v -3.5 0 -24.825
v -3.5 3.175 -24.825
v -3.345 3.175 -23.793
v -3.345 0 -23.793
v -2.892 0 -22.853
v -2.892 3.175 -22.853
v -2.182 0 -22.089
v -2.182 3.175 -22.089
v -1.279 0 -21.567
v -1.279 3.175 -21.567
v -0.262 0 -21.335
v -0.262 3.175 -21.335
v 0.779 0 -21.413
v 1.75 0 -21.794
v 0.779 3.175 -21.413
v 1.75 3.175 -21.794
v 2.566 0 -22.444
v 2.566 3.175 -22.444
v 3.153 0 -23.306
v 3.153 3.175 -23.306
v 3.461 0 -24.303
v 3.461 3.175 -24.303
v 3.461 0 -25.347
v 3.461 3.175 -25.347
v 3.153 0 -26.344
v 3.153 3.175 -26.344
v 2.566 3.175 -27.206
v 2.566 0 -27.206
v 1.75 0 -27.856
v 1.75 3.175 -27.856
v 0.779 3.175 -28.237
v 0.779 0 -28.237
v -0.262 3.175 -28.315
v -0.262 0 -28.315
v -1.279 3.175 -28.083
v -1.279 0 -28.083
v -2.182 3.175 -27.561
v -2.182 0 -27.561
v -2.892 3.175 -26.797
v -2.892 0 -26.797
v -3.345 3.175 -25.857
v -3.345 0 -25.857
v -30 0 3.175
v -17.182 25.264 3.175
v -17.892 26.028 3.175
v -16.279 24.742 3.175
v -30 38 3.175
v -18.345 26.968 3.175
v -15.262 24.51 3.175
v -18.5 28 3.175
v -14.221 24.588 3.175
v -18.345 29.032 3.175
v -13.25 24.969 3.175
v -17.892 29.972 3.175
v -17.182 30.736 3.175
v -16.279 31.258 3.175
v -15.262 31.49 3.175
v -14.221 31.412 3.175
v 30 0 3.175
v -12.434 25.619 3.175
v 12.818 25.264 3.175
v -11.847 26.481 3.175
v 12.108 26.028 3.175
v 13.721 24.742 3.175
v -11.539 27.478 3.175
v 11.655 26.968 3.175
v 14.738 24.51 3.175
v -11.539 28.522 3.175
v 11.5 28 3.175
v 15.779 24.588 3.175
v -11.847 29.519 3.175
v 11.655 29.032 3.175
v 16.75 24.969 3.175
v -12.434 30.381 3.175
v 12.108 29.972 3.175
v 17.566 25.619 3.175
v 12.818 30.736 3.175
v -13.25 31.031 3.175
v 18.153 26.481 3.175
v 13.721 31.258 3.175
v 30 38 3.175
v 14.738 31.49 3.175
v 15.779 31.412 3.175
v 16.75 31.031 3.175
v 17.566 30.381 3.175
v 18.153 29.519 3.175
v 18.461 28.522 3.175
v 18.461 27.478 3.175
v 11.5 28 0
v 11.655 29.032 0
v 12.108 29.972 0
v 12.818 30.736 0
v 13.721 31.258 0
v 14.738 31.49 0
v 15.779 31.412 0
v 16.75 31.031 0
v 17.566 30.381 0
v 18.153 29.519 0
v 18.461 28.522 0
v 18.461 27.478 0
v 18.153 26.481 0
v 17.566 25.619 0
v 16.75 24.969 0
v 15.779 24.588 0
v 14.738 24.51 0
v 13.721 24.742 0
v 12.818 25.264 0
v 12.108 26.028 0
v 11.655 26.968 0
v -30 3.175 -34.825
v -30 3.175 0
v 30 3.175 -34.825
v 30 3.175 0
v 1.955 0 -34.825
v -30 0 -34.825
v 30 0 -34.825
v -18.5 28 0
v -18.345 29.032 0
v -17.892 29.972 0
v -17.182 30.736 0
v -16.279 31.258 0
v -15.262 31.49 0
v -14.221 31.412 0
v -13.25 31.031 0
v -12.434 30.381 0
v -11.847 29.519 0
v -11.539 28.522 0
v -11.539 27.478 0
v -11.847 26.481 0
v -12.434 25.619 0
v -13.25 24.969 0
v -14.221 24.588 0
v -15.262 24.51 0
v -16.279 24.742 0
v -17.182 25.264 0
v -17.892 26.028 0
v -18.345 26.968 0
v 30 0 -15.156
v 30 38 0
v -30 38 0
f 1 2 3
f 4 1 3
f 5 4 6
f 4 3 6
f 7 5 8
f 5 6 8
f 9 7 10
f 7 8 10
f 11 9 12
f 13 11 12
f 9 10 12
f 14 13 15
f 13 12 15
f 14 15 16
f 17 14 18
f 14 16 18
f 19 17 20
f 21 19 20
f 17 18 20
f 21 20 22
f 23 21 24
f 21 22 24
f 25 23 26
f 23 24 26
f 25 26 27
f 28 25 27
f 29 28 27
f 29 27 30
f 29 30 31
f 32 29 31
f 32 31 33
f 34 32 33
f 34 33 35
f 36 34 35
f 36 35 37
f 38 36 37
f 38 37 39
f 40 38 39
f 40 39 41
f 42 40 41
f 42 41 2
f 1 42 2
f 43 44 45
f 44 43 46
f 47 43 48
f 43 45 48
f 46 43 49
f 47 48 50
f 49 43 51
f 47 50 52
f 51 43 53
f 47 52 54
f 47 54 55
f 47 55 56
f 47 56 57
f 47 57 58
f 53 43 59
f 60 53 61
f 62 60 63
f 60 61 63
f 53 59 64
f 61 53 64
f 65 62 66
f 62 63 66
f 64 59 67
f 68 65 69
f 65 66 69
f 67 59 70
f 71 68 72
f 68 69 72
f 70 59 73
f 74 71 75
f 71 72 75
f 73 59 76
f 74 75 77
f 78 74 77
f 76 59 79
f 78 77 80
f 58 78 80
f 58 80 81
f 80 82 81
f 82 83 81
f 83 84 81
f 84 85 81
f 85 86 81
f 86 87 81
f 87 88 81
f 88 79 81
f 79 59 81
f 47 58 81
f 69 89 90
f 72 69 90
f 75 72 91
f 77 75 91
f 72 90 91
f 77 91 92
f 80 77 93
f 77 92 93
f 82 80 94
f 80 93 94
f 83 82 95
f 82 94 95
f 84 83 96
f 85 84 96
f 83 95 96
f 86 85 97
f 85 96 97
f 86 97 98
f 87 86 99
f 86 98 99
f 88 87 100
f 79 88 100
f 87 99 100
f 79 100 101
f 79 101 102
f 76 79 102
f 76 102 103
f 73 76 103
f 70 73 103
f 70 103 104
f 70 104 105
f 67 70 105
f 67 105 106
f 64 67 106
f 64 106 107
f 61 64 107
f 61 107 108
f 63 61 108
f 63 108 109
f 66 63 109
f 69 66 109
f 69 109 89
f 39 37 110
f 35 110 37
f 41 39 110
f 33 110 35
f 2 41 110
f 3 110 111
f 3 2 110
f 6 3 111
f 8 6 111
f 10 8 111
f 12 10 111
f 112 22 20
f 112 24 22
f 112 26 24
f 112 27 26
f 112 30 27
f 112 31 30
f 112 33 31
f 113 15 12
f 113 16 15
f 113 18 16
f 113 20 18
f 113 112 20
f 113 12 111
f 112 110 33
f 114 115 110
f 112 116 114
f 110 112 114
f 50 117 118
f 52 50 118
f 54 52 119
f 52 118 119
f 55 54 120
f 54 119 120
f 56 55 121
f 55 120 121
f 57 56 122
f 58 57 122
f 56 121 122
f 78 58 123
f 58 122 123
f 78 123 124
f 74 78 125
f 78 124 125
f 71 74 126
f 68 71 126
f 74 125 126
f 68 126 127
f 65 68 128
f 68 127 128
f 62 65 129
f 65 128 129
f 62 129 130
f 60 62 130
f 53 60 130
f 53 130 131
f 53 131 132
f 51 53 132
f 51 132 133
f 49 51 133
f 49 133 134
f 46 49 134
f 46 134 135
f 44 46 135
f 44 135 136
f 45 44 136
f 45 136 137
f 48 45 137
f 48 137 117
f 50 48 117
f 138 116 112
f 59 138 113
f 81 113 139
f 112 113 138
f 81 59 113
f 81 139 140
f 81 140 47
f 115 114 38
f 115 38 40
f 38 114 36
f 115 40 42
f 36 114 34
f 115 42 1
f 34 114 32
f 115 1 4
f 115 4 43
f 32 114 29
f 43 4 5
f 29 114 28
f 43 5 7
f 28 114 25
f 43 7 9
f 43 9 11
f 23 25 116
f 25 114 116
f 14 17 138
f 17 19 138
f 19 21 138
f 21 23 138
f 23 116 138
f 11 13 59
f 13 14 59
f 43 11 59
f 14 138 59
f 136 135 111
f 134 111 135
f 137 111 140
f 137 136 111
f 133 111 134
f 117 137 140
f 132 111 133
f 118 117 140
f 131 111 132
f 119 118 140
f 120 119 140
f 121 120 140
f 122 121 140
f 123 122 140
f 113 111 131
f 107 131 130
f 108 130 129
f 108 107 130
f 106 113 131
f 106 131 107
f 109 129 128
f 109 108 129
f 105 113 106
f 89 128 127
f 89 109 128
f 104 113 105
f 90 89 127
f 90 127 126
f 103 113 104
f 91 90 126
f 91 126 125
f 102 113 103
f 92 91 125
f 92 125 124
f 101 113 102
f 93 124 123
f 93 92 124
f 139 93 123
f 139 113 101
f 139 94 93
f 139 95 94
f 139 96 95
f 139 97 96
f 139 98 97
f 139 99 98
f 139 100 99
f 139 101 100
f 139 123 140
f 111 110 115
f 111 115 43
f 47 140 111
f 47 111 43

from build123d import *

# Parameters (mm, degrees)
SKETCH1_W               = 30
SKETCH1_H               = 38
BOSS_EXTRUDE1_DEPTH     = 3.175
SKETCH2_W               = 30
SKETCH2_H               = 3.175
BOSS_EXTRUDE2_DEPTH     = 34.825
SKETCH3_R               = 4
CUT_EXTRUDE1_DEPTH      = 60.638751035
SKETCH4_R               = 4
CUT_EXTRUDE2_DEPTH      = 58.667679423
CROQUIS4_R              = 4
CROQUIS4_R_2            = 3.5
SALIENTE_EXTRUIR2_DEPTH = 5
CROQUIS5_W              = 3.979032683
CROQUIS5_H              = 10.100326852
CORTAR_EXTRUIR1_DEPTH   = 36
CROQUIS6_W              = 38
CROQUIS6_H              = 3.175
SALIENTE_EXTRUIR3_DEPTH = 30
CROQUIS7_W              = 3.175
CROQUIS7_H              = 34.825
SALIENTE_EXTRUIR4_DEPTH = 30
CROQUIS8_R              = 3.5
CORTAR_EXTRUIR2_DEPTH   = 30
CROQUIS9_W              = 28.045440503
CROQUIS9_H              = 19.668665091
SALIENTE_EXTRUIR5_DEPTH = 9
CROQUIS10_W             = 26.699428358
CROQUIS10_H             = 12.946692093
CORTAR_EXTRUIR3_DEPTH   = 65
CROQUIS11_R             = 3.5
CORTAR_EXTRUIR4_DEPTH   = 65


with BuildPart() as part:
    # Sketch1 → Boss-Extrude1 (new body)
    with BuildSketch(Plane.XY):
        with Locations((15, 19)):
            Rectangle(SKETCH1_W, SKETCH1_H)
    extrude(amount=BOSS_EXTRUDE1_DEPTH)

    # Sketch2 → Boss-Extrude2 (add)
    with BuildSketch(Plane(origin=(0, 0, 0), x_dir=(-1, 0, 0), z_dir=(0, 0, -1))):
        with Locations((-15, 1.5875)):
            Rectangle(SKETCH2_W, SKETCH2_H)
    extrude(amount=BOSS_EXTRUDE2_DEPTH)

    # Sketch3 → Cut-Extrude1 (cut, through all)
    with BuildSketch(Plane(origin=(0, 0, 0), x_dir=(-1, 0, 0), z_dir=(0, 0, -1))):
        with Locations((-15, 28)):
            Circle(SKETCH3_R)
    extrude(amount=-CUT_EXTRUDE1_DEPTH, mode=Mode.SUBTRACT)

    # Sketch4 → Cut-Extrude2 (cut, through all)
    with BuildSketch(Plane(origin=(0, 3.175, 0), x_dir=(1, 0, 0), z_dir=(0, 1, 0))):
        with Locations(Location((15, 24.825, 0), (0, 0, 180))):
            Circle(SKETCH4_R)
    extrude(amount=-CUT_EXTRUDE2_DEPTH, mode=Mode.SUBTRACT)

    # Croquis4 → Saliente-Extruir2 (add)
    with BuildSketch(Plane(origin=(0, 0, 0), x_dir=(-1, 0, 0), z_dir=(0, 0, -1))):
        with Locations((-15, 28)):
            Circle(CROQUIS4_R)
        with Locations((-15, 28)):
            Circle(CROQUIS4_R_2, mode=Mode.SUBTRACT)
    extrude(amount=-SALIENTE_EXTRUIR2_DEPTH)

    # Croquis5 → Cortar-Extruir1 (cut)
    with BuildSketch(Plane.ZY):
        with Locations((5.164516342, 27.585777405)):
            Rectangle(CROQUIS5_W, CROQUIS5_H)
    extrude(amount=-CORTAR_EXTRUIR1_DEPTH, mode=Mode.SUBTRACT)

    # Croquis6 → Saliente-Extruir3 (add)
    with BuildSketch(Plane.ZY):
        with Locations((-15.825, 1.5875)):
            Rectangle(CROQUIS6_W, CROQUIS6_H)
    extrude(amount=SALIENTE_EXTRUIR3_DEPTH)

    # Croquis7 → Saliente-Extruir4 (add)
    with BuildSketch(Plane.ZY):
        with Locations((1.5875, 20.5875)):
            Rectangle(CROQUIS7_W, CROQUIS7_H)
    extrude(amount=SALIENTE_EXTRUIR4_DEPTH)

    # Croquis8 → Cortar-Extruir2 (cut)
    with BuildSketch(Plane(origin=(0, 0, 0), x_dir=(-1, 0, 0), z_dir=(0, 0, -1))):
        with Locations((15, 28)):
            Circle(CROQUIS8_R)
    extrude(amount=-CORTAR_EXTRUIR2_DEPTH, mode=Mode.SUBTRACT)

    # Croquis9 → Saliente-Extruir5 (add)
    with BuildSketch(Plane(origin=(0, 3.175, 0), x_dir=(1, 0, 0), z_dir=(0, 1, 0))):
        with Locations((15.977279749, 24.990667455)):
            Rectangle(CROQUIS9_W, CROQUIS9_H)
    extrude(amount=-SALIENTE_EXTRUIR5_DEPTH)

    # Croquis10 → Cortar-Extruir3 (cut)
    with BuildSketch(Plane.ZY.offset(30)):
        with Locations((-21.475285821, -6.473346047)):
            Rectangle(CROQUIS10_W, CROQUIS10_H)
    extrude(amount=-CORTAR_EXTRUIR3_DEPTH, mode=Mode.SUBTRACT)

    # Croquis11 → Cortar-Extruir4 (cut)
    with BuildSketch(Plane(origin=(0, 3.175, 0), x_dir=(1, 0, 0), z_dir=(0, 1, 0))):
        with Locations(Location((0, 24.825, 0), (0, 0, 180))):
            Circle(CROQUIS11_R)
    extrude(amount=-CORTAR_EXTRUIR4_DEPTH, mode=Mode.SUBTRACT)


solid = part.part
